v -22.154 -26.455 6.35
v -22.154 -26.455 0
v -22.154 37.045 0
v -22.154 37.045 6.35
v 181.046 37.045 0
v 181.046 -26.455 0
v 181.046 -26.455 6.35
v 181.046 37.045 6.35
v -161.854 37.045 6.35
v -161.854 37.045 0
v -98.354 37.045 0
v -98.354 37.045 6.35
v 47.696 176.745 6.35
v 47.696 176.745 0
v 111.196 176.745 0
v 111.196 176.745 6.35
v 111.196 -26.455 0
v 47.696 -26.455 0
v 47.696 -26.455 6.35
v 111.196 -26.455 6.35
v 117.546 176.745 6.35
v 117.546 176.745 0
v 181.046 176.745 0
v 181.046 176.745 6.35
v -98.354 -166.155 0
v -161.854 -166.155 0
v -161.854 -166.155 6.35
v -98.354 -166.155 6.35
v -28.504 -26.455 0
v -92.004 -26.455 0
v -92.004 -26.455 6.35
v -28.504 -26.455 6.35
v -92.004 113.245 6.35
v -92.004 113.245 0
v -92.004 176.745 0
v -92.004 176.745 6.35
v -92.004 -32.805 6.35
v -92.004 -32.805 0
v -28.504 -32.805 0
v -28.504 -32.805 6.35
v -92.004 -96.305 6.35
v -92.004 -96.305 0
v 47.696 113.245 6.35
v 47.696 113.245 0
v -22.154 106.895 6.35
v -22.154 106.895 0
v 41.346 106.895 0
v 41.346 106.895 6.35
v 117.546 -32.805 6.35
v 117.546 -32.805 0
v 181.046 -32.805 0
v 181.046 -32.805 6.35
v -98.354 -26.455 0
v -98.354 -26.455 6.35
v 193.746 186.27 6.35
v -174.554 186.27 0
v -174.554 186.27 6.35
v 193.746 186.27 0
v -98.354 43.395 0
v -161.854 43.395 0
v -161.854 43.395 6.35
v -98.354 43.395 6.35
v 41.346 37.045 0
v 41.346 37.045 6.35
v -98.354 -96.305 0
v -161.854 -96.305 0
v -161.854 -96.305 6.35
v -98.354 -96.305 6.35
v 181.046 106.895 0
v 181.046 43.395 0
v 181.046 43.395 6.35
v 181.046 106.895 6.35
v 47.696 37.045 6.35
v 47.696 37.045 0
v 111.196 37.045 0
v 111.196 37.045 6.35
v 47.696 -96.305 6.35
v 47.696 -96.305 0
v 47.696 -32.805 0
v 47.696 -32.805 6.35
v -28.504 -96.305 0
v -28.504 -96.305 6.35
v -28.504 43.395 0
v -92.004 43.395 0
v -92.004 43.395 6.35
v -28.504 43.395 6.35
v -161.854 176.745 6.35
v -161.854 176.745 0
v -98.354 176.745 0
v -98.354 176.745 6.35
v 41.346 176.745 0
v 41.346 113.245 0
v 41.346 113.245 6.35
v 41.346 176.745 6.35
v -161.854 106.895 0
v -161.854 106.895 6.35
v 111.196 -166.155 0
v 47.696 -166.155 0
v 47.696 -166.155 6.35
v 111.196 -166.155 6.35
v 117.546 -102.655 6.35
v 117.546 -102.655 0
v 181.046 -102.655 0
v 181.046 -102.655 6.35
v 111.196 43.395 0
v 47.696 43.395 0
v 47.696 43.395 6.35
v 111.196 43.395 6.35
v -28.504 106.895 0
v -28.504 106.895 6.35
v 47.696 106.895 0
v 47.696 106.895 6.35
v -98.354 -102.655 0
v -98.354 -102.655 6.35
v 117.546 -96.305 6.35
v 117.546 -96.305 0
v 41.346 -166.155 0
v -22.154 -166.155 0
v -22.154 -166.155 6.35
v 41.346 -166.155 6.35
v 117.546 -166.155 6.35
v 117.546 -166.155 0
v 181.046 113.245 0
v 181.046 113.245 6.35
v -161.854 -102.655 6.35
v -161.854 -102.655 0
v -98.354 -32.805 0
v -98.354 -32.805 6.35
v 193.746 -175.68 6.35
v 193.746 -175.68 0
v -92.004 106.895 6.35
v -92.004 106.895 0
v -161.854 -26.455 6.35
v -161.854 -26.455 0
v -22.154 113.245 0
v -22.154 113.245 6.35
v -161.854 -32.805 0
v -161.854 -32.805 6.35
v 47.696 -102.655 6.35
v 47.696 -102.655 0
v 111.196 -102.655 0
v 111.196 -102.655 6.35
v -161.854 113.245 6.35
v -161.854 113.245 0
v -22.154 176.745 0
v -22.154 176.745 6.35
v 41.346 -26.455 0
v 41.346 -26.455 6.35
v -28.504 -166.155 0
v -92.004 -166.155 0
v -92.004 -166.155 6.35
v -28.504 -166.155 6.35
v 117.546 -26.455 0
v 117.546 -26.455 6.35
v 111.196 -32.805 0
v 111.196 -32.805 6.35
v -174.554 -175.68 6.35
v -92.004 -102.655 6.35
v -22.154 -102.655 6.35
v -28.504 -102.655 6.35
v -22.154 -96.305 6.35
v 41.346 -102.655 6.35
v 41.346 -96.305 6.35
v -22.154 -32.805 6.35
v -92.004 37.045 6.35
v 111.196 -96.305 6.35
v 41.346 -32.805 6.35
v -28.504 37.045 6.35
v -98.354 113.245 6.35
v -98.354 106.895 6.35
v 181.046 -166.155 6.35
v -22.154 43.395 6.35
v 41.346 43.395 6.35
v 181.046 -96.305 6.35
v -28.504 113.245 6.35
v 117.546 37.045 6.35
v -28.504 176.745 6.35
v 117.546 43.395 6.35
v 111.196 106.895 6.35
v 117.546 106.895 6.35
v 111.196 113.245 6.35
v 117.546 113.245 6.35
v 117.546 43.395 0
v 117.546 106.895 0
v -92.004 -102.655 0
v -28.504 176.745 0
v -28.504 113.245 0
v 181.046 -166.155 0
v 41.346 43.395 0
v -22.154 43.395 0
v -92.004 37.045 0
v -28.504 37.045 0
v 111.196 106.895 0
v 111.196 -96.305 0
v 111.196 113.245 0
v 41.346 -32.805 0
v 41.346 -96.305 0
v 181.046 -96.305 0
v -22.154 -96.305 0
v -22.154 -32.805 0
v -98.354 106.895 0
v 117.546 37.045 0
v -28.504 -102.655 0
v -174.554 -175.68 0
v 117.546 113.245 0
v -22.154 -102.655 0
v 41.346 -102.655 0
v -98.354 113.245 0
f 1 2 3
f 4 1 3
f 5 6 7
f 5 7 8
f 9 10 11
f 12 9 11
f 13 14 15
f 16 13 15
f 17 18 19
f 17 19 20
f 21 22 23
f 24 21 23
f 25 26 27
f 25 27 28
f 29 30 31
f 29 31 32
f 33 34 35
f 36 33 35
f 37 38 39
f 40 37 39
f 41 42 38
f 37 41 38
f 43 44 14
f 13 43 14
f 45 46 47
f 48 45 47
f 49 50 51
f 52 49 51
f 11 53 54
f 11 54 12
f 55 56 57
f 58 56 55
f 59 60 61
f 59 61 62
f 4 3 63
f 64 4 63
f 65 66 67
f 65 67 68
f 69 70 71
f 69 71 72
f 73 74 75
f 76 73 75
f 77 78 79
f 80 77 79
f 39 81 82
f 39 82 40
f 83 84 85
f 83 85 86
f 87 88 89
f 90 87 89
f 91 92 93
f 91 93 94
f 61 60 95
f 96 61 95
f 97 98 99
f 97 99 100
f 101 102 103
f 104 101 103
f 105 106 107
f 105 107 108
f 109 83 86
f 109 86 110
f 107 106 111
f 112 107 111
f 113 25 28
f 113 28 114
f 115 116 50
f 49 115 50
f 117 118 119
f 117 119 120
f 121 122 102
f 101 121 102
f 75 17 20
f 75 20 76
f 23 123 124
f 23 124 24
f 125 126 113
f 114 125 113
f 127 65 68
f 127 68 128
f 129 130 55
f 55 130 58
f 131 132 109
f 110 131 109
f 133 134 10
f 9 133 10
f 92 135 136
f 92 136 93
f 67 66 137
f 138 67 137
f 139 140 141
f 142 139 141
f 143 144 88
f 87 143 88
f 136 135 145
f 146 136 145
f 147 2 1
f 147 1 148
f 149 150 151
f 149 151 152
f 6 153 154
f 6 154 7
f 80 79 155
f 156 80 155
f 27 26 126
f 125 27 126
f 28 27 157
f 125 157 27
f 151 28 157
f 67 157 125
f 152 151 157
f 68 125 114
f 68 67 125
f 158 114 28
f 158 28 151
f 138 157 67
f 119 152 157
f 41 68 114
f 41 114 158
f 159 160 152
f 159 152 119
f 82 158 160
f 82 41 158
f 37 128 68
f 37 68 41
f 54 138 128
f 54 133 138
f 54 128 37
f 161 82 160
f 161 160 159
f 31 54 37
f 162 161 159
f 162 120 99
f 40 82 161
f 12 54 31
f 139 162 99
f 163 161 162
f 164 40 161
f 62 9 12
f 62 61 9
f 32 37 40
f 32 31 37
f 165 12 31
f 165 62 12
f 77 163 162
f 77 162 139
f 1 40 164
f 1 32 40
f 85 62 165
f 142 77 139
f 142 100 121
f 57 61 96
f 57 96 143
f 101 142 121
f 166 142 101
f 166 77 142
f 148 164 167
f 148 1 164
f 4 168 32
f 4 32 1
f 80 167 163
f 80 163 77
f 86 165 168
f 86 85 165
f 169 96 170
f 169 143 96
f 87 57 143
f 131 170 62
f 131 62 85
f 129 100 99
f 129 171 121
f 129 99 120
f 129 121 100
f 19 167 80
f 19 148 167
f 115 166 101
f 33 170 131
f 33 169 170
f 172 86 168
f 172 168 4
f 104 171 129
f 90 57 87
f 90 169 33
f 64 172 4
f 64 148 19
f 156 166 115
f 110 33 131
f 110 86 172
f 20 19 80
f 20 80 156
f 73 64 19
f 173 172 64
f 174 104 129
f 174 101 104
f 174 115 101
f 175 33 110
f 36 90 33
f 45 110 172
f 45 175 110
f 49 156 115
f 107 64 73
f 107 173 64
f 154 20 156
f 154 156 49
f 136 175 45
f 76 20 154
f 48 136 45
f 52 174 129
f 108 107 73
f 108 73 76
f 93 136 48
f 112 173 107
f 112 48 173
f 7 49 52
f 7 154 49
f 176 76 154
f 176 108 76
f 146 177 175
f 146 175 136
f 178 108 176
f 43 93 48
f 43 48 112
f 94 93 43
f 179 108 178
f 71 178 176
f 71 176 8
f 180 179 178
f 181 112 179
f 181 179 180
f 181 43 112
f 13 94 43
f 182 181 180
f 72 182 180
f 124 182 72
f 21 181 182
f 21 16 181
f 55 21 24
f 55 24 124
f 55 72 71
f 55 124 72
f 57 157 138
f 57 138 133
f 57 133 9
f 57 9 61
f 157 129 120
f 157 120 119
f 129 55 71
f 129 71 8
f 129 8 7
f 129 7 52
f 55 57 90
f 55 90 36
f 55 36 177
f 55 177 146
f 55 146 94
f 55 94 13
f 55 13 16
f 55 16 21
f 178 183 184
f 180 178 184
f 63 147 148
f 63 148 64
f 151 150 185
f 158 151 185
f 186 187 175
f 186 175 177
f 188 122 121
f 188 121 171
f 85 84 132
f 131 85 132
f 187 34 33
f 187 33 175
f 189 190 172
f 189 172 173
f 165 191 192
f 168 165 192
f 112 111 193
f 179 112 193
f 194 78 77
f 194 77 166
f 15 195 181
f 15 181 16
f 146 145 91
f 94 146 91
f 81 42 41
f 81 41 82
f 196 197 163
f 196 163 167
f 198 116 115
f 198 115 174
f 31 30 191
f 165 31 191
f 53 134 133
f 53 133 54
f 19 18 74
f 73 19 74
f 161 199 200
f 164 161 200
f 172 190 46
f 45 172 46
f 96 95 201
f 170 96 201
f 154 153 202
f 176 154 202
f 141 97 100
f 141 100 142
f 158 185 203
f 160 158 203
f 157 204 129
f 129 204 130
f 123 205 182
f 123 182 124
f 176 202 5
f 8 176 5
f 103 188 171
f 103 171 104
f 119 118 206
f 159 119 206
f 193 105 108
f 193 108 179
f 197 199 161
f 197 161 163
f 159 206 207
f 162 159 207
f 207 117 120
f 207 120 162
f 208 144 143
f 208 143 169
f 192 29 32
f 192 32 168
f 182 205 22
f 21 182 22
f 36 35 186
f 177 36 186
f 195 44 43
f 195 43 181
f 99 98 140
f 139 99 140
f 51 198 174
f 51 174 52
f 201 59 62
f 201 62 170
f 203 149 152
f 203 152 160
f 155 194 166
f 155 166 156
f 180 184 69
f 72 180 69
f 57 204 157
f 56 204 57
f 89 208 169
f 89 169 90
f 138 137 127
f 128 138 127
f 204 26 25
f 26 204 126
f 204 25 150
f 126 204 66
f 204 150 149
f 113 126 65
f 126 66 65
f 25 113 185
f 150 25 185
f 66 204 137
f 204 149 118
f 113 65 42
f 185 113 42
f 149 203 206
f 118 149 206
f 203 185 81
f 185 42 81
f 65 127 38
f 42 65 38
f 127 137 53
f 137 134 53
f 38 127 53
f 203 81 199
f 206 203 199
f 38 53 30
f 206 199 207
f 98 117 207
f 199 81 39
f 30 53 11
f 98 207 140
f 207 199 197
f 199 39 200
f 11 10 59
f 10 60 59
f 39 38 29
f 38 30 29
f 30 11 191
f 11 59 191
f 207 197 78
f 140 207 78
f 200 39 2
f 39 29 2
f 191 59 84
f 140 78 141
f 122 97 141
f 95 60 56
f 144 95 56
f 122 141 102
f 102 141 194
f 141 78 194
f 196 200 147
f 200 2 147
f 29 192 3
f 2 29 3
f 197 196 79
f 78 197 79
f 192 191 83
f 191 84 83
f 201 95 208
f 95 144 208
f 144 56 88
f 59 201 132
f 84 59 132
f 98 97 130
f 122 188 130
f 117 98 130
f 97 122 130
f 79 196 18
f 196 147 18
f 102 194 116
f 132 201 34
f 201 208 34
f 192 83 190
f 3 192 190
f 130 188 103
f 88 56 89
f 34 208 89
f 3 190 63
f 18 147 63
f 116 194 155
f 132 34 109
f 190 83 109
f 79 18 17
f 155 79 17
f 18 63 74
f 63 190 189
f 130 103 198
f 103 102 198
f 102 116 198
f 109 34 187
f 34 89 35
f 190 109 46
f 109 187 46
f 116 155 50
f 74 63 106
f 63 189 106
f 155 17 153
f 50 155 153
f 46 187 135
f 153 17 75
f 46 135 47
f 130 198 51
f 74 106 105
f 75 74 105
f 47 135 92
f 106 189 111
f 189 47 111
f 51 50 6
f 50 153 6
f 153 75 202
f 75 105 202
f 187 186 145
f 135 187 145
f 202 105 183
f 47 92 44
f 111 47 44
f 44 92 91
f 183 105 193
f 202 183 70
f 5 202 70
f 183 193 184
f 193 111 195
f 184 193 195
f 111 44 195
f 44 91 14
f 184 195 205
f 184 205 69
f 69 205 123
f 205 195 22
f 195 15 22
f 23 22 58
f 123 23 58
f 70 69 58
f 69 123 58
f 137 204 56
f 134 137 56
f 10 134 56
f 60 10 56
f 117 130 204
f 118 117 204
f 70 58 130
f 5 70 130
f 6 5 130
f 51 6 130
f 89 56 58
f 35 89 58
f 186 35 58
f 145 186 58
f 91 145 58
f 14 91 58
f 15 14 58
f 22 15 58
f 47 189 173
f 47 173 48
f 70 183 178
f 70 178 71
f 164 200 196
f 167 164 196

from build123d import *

# Parameters (mm, degrees)
F0_W     = 368.3
F0_H     = 361.95
F0_W_2   = 63.5
F0_H_2   = 63.5
F1_DEPTH = 6.35


with BuildPart() as f1:
    # F0 (on Top) → F1 (new body)
    with BuildSketch(Plane.XY):
        with Locations((9.59555, 5.294811)):
            Rectangle(F0_W, F0_H)
        with Locations((-130.10445, -134.405189)):
            Rectangle(F0_W_2, F0_H_2, mode=Mode.SUBTRACT)
        with Locations((-60.25445, -134.405189)):
            Rectangle(F0_W_2, F0_H_2, mode=Mode.SUBTRACT)
        with Locations((-130.10445, -64.555189)):
            Rectangle(F0_W_2, F0_H_2, mode=Mode.SUBTRACT)
        with Locations((-130.10445, 5.294811)):
            Rectangle(F0_W_2, F0_H_2, mode=Mode.SUBTRACT)
        with Locations((-60.25445, -64.555189)):
            Rectangle(F0_W_2, F0_H_2, mode=Mode.SUBTRACT)
        with Locations((-60.25445, 5.294811)):
            Rectangle(F0_W_2, F0_H_2, mode=Mode.SUBTRACT)
        with Locations((9.59555, -134.405189)):
            Rectangle(F0_W_2, F0_H_2, mode=Mode.SUBTRACT)
        with Locations((79.44555, -134.405189)):
            Rectangle(F0_W_2, F0_H_2, mode=Mode.SUBTRACT)
        with Locations((149.29555, -134.405189)):
            Rectangle(F0_W_2, F0_H_2, mode=Mode.SUBTRACT)
        with Locations((9.59555, -64.555189)):
            Rectangle(F0_W_2, F0_H_2, mode=Mode.SUBTRACT)
        with Locations((79.44555, -64.555189)):
            Rectangle(F0_W_2, F0_H_2, mode=Mode.SUBTRACT)
        with Locations((9.59555, 5.294811)):
            Rectangle(F0_W_2, F0_H_2, mode=Mode.SUBTRACT)
        with Locations((79.44555, 5.294811)):
            Rectangle(F0_W_2, F0_H_2, mode=Mode.SUBTRACT)
        with Locations((149.29555, -64.555189)):
            Rectangle(F0_W_2, F0_H_2, mode=Mode.SUBTRACT)
        with Locations((149.29555, 5.294811)):
            Rectangle(F0_W_2, F0_H_2, mode=Mode.SUBTRACT)
        with Locations((-130.10445, 75.144811)):
            Rectangle(F0_W_2, F0_H_2, mode=Mode.SUBTRACT)
        with Locations((-60.25445, 75.144811)):
            Rectangle(F0_W_2, F0_H_2, mode=Mode.SUBTRACT)
        with Locations((-130.10445, 144.994811)):
            Rectangle(F0_W_2, F0_H_2, mode=Mode.SUBTRACT)
        with Locations((-60.25445, 144.994811)):
            Rectangle(F0_W_2, F0_H_2, mode=Mode.SUBTRACT)
        with Locations((9.59555, 75.144811)):
            Rectangle(F0_W_2, F0_H_2, mode=Mode.SUBTRACT)
        with Locations((79.44555, 75.144811)):
            Rectangle(F0_W_2, F0_H_2, mode=Mode.SUBTRACT)
        with Locations((149.29555, 75.144811)):
            Rectangle(F0_W_2, F0_H_2, mode=Mode.SUBTRACT)
        with Locations((9.59555, 144.994811)):
            Rectangle(F0_W_2, F0_H_2, mode=Mode.SUBTRACT)
        with Locations((79.44555, 144.994811)):
            Rectangle(F0_W_2, F0_H_2, mode=Mode.SUBTRACT)
        with Locations((149.29555, 144.994811)):
            Rectangle(F0_W_2, F0_H_2, mode=Mode.SUBTRACT)
    extrude(amount=F1_DEPTH)


solid = f1.part
